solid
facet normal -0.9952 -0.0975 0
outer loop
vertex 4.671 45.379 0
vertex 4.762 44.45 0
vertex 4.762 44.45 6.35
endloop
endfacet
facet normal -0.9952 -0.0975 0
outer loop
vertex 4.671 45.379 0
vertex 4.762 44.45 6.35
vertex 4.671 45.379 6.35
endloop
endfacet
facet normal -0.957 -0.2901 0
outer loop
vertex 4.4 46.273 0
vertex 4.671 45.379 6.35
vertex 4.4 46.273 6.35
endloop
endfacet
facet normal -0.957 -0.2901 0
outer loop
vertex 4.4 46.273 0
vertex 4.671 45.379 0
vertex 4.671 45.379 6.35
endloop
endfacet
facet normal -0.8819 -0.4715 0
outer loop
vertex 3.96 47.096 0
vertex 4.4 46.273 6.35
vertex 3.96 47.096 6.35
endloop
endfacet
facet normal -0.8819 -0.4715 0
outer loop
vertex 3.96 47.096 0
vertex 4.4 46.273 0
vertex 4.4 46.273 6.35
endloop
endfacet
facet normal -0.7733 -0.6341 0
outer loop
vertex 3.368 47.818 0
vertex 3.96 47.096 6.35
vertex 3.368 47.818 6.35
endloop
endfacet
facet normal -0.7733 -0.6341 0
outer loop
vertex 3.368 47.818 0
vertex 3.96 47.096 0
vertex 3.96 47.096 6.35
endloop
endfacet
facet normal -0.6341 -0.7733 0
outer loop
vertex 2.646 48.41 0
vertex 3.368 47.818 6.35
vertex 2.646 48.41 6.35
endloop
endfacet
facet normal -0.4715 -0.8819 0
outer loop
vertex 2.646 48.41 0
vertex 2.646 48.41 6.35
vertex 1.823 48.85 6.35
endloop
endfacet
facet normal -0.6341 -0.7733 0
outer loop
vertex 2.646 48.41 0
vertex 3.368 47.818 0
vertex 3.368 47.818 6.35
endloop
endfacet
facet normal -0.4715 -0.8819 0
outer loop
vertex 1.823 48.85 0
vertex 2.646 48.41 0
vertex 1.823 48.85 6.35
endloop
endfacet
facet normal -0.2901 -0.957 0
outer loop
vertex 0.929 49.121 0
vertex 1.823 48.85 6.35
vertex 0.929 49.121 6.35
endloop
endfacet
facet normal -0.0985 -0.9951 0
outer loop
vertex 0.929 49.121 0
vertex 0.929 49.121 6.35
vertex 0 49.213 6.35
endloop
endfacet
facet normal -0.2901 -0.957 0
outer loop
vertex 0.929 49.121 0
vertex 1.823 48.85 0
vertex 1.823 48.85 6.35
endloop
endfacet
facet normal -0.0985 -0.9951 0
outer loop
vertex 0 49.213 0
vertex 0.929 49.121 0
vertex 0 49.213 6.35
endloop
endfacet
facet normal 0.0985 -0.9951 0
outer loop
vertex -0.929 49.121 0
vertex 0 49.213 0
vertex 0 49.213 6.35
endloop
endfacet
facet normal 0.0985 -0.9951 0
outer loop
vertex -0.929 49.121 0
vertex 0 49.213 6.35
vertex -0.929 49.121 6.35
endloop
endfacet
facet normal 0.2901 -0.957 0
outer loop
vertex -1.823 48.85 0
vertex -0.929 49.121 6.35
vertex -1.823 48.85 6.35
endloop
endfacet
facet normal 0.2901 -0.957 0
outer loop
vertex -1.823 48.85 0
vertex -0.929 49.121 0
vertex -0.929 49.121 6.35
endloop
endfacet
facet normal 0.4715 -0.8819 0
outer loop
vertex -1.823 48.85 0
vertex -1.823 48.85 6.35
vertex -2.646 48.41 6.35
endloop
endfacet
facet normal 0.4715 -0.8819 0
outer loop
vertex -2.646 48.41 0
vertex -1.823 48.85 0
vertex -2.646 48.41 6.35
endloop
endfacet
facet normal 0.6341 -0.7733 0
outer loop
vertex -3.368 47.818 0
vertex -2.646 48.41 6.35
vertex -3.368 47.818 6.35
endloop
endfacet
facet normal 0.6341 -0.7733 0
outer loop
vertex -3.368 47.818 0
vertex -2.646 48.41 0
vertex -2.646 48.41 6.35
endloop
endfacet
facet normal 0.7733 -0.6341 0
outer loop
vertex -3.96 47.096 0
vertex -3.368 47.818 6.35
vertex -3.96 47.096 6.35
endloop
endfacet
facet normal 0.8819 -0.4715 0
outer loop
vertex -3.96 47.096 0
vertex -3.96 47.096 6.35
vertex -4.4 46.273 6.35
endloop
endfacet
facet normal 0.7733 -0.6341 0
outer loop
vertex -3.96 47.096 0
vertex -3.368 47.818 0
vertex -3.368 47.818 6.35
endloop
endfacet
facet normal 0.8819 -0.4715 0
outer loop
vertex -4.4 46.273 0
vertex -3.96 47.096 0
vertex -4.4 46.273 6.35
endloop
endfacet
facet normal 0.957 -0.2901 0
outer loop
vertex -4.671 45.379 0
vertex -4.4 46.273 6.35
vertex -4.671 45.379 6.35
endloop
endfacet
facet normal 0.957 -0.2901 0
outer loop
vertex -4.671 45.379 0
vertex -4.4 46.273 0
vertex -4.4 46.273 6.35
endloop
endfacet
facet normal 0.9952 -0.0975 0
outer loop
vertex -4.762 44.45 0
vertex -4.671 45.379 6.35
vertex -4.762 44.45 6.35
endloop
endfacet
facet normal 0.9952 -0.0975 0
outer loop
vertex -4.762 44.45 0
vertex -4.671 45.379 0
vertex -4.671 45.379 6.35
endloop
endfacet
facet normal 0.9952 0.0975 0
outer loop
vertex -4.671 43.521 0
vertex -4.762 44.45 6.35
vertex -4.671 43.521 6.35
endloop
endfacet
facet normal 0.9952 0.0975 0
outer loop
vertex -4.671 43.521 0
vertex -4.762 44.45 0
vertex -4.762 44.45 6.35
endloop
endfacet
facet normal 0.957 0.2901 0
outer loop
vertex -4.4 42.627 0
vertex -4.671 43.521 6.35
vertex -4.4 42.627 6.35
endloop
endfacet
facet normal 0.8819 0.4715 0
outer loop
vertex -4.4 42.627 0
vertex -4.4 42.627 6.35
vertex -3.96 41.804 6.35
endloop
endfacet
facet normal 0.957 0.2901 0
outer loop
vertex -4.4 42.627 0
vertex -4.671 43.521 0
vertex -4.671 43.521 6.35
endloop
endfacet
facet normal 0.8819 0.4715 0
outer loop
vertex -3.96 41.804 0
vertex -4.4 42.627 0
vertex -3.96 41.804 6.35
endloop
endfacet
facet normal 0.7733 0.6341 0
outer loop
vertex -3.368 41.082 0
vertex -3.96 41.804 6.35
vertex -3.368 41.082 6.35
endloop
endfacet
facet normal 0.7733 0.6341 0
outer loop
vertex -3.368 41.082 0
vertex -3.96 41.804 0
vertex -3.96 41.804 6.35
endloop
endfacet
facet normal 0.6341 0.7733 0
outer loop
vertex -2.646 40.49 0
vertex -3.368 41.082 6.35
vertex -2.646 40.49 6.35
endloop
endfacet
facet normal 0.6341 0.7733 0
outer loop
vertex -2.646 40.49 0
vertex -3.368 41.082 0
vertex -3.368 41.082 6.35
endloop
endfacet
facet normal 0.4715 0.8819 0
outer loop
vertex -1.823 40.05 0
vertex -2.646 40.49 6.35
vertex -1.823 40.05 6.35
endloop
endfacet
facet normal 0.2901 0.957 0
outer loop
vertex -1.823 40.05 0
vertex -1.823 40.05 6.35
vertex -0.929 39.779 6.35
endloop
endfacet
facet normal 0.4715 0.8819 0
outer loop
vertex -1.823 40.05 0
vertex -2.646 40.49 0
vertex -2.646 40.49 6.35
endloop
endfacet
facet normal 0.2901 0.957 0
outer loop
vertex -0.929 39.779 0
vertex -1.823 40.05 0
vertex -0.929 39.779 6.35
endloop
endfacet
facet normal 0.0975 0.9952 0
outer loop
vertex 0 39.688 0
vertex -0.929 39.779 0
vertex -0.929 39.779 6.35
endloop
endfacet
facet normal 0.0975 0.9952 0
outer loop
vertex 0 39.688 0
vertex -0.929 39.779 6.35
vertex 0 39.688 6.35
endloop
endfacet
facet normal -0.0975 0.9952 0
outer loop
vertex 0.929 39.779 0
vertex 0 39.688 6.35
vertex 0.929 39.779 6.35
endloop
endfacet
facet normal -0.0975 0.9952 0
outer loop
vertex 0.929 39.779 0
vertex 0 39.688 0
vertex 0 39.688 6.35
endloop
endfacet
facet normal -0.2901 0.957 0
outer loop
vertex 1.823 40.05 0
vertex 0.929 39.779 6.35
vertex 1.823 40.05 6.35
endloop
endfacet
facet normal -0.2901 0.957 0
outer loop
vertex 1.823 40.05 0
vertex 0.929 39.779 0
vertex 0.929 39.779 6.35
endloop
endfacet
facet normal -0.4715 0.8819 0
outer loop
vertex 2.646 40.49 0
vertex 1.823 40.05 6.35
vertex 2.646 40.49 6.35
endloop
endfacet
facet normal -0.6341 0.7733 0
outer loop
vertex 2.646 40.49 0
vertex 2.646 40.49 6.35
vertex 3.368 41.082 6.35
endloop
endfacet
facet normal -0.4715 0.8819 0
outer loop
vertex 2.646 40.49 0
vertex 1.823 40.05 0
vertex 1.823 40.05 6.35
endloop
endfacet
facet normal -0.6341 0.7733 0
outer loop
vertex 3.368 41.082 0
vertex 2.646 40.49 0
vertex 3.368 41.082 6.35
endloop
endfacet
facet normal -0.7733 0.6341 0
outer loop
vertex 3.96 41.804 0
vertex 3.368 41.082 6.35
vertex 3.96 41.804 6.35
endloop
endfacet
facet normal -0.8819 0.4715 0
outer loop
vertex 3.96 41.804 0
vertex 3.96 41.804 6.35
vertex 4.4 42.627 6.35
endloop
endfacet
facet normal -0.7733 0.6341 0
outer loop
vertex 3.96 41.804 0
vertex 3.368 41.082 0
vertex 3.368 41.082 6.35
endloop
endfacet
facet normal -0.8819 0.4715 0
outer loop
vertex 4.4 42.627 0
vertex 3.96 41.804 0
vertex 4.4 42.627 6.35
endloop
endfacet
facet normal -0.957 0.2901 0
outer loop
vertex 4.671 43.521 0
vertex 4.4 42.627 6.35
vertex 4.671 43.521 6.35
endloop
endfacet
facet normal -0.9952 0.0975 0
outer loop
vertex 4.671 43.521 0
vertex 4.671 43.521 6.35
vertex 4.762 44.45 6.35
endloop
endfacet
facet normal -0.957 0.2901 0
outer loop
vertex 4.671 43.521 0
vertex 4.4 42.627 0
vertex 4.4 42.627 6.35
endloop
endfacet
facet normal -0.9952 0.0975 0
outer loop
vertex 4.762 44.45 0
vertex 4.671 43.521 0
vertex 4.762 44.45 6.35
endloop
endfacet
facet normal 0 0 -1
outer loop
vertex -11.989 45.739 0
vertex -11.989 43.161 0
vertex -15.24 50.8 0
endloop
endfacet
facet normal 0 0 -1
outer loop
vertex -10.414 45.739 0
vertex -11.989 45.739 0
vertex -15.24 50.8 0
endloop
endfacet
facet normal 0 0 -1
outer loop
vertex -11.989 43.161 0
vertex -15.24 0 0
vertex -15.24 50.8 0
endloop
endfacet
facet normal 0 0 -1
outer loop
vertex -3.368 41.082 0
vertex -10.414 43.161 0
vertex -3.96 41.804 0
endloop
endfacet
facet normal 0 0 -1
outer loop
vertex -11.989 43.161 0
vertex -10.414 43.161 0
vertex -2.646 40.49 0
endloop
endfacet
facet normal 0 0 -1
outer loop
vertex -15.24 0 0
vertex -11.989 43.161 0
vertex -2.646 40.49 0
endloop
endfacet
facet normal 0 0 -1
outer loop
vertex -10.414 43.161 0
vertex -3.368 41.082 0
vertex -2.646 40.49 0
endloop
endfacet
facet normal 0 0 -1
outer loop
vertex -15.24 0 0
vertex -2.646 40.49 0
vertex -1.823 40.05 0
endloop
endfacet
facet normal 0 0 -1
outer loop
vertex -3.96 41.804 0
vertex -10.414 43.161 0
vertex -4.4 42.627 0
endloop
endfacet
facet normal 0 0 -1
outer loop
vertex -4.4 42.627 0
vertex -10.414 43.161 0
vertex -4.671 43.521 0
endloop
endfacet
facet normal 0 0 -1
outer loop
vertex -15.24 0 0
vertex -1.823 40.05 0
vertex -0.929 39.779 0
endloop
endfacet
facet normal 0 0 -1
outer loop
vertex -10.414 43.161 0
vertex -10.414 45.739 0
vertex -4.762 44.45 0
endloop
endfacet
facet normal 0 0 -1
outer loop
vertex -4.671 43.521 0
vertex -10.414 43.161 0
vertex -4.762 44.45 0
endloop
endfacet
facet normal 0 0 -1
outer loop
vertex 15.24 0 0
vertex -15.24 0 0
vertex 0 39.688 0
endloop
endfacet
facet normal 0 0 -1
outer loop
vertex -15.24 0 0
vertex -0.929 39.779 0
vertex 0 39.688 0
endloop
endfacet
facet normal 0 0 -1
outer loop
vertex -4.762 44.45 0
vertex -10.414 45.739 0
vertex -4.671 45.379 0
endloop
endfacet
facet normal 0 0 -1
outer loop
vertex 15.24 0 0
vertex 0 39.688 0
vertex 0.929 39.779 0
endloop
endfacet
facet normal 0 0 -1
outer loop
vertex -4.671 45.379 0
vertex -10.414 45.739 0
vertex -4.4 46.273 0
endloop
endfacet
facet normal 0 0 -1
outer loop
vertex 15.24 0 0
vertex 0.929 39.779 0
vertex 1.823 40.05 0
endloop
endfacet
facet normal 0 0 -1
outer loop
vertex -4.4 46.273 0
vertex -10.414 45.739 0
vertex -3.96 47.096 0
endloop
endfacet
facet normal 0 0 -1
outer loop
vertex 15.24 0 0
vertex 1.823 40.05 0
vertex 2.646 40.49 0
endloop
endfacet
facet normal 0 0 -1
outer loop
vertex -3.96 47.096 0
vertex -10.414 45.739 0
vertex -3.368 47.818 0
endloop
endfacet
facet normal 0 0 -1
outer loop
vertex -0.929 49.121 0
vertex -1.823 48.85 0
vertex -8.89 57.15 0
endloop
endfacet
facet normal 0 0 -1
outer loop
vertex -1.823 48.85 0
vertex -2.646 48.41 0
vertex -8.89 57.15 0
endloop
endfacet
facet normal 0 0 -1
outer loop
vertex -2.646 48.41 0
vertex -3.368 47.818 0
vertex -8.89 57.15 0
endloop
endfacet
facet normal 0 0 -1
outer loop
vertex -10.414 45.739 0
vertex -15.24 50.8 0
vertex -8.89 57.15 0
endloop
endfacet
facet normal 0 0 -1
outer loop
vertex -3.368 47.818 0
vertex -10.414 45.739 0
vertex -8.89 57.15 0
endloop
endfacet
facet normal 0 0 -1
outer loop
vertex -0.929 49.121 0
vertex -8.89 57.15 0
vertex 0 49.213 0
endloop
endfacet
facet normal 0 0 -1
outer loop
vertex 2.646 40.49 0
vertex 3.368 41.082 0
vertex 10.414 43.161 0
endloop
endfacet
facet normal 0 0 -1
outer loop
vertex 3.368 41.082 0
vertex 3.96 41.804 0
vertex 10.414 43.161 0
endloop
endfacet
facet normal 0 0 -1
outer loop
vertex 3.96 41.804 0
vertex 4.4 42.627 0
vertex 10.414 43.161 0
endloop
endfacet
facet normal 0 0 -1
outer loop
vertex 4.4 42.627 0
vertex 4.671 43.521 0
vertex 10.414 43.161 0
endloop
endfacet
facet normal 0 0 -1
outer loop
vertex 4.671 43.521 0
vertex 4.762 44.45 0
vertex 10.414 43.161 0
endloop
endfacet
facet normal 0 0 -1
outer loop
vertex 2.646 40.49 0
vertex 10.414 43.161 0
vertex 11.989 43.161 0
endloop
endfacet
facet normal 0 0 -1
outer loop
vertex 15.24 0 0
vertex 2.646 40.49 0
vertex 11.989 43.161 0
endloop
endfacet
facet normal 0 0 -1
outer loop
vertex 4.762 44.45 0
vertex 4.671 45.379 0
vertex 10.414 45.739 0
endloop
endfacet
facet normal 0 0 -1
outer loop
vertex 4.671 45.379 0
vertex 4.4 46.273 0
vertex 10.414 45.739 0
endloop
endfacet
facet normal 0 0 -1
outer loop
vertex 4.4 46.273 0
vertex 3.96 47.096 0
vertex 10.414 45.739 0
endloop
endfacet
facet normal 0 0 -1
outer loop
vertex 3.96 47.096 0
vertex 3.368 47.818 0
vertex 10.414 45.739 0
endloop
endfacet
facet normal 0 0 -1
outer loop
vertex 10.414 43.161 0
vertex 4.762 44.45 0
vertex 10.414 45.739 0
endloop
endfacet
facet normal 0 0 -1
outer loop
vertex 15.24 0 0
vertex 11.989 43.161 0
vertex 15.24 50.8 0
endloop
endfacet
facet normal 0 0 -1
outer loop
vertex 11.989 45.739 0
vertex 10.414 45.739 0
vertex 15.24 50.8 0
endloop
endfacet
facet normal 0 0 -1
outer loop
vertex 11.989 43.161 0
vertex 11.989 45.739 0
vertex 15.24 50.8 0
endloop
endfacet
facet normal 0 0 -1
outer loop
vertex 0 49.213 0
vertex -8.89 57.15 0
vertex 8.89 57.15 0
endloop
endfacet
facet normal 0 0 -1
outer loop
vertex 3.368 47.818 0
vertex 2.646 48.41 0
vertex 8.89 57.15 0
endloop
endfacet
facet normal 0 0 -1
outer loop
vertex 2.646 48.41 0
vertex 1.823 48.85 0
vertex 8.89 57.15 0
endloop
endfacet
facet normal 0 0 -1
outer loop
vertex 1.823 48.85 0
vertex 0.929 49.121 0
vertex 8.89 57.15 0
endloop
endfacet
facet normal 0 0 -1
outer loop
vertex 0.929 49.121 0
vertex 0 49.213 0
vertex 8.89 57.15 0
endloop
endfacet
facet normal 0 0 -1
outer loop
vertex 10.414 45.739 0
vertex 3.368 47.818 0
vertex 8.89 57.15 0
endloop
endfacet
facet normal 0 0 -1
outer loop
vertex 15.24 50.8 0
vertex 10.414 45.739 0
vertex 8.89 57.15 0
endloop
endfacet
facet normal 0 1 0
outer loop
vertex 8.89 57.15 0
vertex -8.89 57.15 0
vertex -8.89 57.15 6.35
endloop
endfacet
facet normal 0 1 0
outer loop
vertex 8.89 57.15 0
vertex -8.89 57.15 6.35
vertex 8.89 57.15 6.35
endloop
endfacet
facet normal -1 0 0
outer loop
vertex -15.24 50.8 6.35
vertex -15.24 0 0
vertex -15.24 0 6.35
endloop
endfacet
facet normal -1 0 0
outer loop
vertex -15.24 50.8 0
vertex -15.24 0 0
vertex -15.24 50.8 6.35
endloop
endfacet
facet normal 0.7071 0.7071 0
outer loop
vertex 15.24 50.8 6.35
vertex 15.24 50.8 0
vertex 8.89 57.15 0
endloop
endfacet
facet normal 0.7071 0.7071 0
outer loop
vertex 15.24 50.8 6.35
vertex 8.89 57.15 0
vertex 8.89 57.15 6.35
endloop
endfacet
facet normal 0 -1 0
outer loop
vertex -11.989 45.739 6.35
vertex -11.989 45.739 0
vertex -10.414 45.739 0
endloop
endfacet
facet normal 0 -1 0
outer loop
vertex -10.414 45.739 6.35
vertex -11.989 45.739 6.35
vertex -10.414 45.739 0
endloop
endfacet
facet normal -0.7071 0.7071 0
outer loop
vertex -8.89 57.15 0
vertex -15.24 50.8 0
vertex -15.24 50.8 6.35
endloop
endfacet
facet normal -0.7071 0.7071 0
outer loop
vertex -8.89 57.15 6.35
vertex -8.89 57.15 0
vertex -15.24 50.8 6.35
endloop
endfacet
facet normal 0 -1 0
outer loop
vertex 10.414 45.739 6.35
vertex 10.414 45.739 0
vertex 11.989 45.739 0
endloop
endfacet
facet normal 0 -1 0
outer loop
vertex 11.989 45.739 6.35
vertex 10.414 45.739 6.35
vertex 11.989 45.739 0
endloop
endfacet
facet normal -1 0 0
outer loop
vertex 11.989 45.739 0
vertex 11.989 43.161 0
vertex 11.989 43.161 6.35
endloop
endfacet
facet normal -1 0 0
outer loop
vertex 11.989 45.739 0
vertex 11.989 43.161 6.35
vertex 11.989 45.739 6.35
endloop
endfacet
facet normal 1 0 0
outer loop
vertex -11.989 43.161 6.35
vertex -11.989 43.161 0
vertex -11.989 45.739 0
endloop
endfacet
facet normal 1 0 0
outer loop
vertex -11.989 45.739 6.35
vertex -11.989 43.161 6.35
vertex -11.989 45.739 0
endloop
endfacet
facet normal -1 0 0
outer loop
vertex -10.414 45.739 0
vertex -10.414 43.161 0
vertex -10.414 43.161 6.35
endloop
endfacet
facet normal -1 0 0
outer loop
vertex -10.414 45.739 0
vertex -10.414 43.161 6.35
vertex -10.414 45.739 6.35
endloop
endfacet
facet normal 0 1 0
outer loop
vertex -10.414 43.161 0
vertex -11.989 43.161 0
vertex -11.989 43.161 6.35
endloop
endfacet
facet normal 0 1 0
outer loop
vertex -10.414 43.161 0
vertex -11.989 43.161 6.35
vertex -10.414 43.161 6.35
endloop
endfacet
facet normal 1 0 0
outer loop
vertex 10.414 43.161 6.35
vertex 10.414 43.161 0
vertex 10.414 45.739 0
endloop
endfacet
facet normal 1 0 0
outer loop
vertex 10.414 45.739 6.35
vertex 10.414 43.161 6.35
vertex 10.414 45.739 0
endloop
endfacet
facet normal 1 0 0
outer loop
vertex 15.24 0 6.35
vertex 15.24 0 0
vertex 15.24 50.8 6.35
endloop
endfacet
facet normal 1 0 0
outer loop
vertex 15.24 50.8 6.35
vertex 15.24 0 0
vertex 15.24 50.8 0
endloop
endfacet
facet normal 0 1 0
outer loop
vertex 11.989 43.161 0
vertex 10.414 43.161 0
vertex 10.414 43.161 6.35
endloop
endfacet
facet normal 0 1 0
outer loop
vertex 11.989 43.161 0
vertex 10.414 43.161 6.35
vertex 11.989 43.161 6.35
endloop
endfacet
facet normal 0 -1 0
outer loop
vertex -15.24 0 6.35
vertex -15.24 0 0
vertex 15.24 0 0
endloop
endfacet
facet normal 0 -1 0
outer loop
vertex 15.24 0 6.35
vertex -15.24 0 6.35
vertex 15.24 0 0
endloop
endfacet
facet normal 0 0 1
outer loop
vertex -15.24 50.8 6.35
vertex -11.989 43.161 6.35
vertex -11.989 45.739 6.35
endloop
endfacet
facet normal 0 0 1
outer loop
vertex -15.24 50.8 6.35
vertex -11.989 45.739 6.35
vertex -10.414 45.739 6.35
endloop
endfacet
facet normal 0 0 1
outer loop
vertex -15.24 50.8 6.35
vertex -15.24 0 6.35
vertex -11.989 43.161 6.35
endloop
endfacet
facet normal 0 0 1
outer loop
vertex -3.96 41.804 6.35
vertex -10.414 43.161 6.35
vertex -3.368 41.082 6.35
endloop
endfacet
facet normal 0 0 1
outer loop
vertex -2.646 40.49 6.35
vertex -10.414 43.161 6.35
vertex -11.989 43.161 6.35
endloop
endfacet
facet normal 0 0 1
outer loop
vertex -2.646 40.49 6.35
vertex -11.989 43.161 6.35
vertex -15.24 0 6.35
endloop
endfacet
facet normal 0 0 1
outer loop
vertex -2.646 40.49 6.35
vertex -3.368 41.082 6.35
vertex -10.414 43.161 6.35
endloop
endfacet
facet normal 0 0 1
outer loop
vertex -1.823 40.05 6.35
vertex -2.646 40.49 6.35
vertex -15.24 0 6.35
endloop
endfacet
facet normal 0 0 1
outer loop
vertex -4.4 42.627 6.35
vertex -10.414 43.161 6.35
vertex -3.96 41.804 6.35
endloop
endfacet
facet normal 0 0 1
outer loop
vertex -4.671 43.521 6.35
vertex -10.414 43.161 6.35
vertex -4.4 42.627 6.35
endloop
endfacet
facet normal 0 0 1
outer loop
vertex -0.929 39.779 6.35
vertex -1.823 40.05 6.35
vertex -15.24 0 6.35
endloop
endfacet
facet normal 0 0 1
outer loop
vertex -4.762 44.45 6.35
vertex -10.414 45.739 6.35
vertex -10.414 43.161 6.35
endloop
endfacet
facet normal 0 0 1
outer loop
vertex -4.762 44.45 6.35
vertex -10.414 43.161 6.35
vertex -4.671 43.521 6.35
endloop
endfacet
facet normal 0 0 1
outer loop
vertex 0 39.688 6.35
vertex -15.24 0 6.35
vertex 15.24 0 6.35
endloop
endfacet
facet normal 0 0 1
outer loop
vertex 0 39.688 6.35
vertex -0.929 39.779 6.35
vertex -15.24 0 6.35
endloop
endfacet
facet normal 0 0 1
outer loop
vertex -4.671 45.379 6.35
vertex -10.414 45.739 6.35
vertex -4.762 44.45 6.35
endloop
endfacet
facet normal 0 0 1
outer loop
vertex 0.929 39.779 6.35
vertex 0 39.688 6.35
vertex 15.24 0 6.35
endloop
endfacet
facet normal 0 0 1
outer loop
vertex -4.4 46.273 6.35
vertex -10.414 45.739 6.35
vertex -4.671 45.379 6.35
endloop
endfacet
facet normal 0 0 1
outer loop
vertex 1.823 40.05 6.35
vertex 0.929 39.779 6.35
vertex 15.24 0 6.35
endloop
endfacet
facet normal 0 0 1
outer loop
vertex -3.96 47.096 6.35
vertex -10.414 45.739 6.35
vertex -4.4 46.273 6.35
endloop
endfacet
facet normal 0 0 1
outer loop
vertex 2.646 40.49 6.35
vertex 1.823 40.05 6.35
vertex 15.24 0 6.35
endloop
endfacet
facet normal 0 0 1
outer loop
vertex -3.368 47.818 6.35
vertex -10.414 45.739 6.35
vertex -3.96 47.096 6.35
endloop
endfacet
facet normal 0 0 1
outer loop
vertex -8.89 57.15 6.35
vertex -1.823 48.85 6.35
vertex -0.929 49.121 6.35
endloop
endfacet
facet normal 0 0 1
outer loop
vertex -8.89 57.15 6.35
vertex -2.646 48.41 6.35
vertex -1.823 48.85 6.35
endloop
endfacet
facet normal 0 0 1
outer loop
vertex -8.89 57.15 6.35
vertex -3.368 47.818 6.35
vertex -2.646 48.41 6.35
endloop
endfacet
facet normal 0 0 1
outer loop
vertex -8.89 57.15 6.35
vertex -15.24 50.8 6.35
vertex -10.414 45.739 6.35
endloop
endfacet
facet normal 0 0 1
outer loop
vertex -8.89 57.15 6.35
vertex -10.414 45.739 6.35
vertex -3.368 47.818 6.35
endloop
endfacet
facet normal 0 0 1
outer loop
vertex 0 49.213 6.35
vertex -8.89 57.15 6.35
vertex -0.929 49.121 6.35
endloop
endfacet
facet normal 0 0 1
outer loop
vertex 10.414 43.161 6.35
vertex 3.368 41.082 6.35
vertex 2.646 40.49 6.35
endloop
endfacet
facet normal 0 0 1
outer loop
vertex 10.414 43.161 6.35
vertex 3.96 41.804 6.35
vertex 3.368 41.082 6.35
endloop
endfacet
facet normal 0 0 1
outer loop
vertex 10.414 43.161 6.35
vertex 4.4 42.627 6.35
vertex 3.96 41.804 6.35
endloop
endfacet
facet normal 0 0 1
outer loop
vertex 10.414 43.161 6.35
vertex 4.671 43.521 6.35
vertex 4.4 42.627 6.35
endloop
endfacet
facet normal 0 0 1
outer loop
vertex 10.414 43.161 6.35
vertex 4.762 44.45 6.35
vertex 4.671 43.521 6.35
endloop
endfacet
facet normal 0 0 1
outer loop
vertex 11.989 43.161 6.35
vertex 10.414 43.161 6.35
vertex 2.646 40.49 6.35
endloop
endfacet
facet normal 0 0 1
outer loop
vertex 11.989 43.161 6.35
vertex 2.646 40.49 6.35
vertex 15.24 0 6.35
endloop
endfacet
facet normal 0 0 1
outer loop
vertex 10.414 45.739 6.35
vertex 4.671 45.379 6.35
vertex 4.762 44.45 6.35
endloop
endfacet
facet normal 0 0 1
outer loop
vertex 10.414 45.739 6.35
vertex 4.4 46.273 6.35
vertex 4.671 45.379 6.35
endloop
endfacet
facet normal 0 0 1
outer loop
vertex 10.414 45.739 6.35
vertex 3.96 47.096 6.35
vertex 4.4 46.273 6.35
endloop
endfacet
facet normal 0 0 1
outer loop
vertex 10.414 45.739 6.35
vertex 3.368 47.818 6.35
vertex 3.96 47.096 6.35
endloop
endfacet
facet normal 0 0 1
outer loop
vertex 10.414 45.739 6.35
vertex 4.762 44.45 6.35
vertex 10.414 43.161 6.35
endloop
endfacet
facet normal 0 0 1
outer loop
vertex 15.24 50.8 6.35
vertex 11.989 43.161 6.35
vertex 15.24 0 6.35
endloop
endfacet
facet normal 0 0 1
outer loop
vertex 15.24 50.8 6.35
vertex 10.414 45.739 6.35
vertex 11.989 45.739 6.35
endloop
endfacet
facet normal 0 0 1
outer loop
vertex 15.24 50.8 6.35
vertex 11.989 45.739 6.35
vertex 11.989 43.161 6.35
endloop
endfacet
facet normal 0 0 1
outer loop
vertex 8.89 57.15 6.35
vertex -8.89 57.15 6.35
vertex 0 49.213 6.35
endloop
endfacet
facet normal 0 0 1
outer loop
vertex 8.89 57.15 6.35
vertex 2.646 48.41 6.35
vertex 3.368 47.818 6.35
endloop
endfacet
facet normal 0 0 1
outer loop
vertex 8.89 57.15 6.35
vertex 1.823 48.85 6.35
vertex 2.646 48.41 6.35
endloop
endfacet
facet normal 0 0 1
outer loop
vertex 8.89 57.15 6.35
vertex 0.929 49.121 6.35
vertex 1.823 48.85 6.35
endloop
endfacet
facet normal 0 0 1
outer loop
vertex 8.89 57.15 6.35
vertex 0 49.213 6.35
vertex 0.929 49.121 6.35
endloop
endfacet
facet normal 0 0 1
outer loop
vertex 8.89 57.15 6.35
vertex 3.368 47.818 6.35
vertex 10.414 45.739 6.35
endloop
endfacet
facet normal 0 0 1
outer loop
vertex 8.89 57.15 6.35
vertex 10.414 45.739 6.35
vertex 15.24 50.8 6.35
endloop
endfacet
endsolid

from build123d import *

# Parameters (mm, degrees)
SKETCH1_W           = 30.48
SKETCH1_H           = 57.15
SKETCH1_R           = 4.7625
SKETCH1_W_2         = 1.5748
SKETCH1_H_2         = 2.5781
BOSS_EXTRUDE1_DEPTH = 6.35
CHAMFER1_SIZE       = 6.35


with BuildPart() as part:
    # Sketch1 → Boss-Extrude1 (new body)
    with BuildSketch(Plane.XY):
        with Locations((0, 28.575)):
            Rectangle(SKETCH1_W, SKETCH1_H)
        with Locations((0, 44.45)):
            Circle(SKETCH1_R, mode=Mode.SUBTRACT)
        with Locations((-11.2014, 44.45)):
            Rectangle(SKETCH1_W_2, SKETCH1_H_2, mode=Mode.SUBTRACT)
        with Locations((11.2014, 44.45)):
            Rectangle(SKETCH1_W_2, SKETCH1_H_2, mode=Mode.SUBTRACT)
    extrude(amount=BOSS_EXTRUDE1_DEPTH)

    # Chamfer1
    chamfer1_edges = [part.edges().sort_by_distance(p)[0] for p in [
        (15.24, 57.15, 3.175),
        (-15.24, 57.15, 3.175),
    ]]
    chamfer(chamfer1_edges, length=CHAMFER1_SIZE)


solid = part.part
